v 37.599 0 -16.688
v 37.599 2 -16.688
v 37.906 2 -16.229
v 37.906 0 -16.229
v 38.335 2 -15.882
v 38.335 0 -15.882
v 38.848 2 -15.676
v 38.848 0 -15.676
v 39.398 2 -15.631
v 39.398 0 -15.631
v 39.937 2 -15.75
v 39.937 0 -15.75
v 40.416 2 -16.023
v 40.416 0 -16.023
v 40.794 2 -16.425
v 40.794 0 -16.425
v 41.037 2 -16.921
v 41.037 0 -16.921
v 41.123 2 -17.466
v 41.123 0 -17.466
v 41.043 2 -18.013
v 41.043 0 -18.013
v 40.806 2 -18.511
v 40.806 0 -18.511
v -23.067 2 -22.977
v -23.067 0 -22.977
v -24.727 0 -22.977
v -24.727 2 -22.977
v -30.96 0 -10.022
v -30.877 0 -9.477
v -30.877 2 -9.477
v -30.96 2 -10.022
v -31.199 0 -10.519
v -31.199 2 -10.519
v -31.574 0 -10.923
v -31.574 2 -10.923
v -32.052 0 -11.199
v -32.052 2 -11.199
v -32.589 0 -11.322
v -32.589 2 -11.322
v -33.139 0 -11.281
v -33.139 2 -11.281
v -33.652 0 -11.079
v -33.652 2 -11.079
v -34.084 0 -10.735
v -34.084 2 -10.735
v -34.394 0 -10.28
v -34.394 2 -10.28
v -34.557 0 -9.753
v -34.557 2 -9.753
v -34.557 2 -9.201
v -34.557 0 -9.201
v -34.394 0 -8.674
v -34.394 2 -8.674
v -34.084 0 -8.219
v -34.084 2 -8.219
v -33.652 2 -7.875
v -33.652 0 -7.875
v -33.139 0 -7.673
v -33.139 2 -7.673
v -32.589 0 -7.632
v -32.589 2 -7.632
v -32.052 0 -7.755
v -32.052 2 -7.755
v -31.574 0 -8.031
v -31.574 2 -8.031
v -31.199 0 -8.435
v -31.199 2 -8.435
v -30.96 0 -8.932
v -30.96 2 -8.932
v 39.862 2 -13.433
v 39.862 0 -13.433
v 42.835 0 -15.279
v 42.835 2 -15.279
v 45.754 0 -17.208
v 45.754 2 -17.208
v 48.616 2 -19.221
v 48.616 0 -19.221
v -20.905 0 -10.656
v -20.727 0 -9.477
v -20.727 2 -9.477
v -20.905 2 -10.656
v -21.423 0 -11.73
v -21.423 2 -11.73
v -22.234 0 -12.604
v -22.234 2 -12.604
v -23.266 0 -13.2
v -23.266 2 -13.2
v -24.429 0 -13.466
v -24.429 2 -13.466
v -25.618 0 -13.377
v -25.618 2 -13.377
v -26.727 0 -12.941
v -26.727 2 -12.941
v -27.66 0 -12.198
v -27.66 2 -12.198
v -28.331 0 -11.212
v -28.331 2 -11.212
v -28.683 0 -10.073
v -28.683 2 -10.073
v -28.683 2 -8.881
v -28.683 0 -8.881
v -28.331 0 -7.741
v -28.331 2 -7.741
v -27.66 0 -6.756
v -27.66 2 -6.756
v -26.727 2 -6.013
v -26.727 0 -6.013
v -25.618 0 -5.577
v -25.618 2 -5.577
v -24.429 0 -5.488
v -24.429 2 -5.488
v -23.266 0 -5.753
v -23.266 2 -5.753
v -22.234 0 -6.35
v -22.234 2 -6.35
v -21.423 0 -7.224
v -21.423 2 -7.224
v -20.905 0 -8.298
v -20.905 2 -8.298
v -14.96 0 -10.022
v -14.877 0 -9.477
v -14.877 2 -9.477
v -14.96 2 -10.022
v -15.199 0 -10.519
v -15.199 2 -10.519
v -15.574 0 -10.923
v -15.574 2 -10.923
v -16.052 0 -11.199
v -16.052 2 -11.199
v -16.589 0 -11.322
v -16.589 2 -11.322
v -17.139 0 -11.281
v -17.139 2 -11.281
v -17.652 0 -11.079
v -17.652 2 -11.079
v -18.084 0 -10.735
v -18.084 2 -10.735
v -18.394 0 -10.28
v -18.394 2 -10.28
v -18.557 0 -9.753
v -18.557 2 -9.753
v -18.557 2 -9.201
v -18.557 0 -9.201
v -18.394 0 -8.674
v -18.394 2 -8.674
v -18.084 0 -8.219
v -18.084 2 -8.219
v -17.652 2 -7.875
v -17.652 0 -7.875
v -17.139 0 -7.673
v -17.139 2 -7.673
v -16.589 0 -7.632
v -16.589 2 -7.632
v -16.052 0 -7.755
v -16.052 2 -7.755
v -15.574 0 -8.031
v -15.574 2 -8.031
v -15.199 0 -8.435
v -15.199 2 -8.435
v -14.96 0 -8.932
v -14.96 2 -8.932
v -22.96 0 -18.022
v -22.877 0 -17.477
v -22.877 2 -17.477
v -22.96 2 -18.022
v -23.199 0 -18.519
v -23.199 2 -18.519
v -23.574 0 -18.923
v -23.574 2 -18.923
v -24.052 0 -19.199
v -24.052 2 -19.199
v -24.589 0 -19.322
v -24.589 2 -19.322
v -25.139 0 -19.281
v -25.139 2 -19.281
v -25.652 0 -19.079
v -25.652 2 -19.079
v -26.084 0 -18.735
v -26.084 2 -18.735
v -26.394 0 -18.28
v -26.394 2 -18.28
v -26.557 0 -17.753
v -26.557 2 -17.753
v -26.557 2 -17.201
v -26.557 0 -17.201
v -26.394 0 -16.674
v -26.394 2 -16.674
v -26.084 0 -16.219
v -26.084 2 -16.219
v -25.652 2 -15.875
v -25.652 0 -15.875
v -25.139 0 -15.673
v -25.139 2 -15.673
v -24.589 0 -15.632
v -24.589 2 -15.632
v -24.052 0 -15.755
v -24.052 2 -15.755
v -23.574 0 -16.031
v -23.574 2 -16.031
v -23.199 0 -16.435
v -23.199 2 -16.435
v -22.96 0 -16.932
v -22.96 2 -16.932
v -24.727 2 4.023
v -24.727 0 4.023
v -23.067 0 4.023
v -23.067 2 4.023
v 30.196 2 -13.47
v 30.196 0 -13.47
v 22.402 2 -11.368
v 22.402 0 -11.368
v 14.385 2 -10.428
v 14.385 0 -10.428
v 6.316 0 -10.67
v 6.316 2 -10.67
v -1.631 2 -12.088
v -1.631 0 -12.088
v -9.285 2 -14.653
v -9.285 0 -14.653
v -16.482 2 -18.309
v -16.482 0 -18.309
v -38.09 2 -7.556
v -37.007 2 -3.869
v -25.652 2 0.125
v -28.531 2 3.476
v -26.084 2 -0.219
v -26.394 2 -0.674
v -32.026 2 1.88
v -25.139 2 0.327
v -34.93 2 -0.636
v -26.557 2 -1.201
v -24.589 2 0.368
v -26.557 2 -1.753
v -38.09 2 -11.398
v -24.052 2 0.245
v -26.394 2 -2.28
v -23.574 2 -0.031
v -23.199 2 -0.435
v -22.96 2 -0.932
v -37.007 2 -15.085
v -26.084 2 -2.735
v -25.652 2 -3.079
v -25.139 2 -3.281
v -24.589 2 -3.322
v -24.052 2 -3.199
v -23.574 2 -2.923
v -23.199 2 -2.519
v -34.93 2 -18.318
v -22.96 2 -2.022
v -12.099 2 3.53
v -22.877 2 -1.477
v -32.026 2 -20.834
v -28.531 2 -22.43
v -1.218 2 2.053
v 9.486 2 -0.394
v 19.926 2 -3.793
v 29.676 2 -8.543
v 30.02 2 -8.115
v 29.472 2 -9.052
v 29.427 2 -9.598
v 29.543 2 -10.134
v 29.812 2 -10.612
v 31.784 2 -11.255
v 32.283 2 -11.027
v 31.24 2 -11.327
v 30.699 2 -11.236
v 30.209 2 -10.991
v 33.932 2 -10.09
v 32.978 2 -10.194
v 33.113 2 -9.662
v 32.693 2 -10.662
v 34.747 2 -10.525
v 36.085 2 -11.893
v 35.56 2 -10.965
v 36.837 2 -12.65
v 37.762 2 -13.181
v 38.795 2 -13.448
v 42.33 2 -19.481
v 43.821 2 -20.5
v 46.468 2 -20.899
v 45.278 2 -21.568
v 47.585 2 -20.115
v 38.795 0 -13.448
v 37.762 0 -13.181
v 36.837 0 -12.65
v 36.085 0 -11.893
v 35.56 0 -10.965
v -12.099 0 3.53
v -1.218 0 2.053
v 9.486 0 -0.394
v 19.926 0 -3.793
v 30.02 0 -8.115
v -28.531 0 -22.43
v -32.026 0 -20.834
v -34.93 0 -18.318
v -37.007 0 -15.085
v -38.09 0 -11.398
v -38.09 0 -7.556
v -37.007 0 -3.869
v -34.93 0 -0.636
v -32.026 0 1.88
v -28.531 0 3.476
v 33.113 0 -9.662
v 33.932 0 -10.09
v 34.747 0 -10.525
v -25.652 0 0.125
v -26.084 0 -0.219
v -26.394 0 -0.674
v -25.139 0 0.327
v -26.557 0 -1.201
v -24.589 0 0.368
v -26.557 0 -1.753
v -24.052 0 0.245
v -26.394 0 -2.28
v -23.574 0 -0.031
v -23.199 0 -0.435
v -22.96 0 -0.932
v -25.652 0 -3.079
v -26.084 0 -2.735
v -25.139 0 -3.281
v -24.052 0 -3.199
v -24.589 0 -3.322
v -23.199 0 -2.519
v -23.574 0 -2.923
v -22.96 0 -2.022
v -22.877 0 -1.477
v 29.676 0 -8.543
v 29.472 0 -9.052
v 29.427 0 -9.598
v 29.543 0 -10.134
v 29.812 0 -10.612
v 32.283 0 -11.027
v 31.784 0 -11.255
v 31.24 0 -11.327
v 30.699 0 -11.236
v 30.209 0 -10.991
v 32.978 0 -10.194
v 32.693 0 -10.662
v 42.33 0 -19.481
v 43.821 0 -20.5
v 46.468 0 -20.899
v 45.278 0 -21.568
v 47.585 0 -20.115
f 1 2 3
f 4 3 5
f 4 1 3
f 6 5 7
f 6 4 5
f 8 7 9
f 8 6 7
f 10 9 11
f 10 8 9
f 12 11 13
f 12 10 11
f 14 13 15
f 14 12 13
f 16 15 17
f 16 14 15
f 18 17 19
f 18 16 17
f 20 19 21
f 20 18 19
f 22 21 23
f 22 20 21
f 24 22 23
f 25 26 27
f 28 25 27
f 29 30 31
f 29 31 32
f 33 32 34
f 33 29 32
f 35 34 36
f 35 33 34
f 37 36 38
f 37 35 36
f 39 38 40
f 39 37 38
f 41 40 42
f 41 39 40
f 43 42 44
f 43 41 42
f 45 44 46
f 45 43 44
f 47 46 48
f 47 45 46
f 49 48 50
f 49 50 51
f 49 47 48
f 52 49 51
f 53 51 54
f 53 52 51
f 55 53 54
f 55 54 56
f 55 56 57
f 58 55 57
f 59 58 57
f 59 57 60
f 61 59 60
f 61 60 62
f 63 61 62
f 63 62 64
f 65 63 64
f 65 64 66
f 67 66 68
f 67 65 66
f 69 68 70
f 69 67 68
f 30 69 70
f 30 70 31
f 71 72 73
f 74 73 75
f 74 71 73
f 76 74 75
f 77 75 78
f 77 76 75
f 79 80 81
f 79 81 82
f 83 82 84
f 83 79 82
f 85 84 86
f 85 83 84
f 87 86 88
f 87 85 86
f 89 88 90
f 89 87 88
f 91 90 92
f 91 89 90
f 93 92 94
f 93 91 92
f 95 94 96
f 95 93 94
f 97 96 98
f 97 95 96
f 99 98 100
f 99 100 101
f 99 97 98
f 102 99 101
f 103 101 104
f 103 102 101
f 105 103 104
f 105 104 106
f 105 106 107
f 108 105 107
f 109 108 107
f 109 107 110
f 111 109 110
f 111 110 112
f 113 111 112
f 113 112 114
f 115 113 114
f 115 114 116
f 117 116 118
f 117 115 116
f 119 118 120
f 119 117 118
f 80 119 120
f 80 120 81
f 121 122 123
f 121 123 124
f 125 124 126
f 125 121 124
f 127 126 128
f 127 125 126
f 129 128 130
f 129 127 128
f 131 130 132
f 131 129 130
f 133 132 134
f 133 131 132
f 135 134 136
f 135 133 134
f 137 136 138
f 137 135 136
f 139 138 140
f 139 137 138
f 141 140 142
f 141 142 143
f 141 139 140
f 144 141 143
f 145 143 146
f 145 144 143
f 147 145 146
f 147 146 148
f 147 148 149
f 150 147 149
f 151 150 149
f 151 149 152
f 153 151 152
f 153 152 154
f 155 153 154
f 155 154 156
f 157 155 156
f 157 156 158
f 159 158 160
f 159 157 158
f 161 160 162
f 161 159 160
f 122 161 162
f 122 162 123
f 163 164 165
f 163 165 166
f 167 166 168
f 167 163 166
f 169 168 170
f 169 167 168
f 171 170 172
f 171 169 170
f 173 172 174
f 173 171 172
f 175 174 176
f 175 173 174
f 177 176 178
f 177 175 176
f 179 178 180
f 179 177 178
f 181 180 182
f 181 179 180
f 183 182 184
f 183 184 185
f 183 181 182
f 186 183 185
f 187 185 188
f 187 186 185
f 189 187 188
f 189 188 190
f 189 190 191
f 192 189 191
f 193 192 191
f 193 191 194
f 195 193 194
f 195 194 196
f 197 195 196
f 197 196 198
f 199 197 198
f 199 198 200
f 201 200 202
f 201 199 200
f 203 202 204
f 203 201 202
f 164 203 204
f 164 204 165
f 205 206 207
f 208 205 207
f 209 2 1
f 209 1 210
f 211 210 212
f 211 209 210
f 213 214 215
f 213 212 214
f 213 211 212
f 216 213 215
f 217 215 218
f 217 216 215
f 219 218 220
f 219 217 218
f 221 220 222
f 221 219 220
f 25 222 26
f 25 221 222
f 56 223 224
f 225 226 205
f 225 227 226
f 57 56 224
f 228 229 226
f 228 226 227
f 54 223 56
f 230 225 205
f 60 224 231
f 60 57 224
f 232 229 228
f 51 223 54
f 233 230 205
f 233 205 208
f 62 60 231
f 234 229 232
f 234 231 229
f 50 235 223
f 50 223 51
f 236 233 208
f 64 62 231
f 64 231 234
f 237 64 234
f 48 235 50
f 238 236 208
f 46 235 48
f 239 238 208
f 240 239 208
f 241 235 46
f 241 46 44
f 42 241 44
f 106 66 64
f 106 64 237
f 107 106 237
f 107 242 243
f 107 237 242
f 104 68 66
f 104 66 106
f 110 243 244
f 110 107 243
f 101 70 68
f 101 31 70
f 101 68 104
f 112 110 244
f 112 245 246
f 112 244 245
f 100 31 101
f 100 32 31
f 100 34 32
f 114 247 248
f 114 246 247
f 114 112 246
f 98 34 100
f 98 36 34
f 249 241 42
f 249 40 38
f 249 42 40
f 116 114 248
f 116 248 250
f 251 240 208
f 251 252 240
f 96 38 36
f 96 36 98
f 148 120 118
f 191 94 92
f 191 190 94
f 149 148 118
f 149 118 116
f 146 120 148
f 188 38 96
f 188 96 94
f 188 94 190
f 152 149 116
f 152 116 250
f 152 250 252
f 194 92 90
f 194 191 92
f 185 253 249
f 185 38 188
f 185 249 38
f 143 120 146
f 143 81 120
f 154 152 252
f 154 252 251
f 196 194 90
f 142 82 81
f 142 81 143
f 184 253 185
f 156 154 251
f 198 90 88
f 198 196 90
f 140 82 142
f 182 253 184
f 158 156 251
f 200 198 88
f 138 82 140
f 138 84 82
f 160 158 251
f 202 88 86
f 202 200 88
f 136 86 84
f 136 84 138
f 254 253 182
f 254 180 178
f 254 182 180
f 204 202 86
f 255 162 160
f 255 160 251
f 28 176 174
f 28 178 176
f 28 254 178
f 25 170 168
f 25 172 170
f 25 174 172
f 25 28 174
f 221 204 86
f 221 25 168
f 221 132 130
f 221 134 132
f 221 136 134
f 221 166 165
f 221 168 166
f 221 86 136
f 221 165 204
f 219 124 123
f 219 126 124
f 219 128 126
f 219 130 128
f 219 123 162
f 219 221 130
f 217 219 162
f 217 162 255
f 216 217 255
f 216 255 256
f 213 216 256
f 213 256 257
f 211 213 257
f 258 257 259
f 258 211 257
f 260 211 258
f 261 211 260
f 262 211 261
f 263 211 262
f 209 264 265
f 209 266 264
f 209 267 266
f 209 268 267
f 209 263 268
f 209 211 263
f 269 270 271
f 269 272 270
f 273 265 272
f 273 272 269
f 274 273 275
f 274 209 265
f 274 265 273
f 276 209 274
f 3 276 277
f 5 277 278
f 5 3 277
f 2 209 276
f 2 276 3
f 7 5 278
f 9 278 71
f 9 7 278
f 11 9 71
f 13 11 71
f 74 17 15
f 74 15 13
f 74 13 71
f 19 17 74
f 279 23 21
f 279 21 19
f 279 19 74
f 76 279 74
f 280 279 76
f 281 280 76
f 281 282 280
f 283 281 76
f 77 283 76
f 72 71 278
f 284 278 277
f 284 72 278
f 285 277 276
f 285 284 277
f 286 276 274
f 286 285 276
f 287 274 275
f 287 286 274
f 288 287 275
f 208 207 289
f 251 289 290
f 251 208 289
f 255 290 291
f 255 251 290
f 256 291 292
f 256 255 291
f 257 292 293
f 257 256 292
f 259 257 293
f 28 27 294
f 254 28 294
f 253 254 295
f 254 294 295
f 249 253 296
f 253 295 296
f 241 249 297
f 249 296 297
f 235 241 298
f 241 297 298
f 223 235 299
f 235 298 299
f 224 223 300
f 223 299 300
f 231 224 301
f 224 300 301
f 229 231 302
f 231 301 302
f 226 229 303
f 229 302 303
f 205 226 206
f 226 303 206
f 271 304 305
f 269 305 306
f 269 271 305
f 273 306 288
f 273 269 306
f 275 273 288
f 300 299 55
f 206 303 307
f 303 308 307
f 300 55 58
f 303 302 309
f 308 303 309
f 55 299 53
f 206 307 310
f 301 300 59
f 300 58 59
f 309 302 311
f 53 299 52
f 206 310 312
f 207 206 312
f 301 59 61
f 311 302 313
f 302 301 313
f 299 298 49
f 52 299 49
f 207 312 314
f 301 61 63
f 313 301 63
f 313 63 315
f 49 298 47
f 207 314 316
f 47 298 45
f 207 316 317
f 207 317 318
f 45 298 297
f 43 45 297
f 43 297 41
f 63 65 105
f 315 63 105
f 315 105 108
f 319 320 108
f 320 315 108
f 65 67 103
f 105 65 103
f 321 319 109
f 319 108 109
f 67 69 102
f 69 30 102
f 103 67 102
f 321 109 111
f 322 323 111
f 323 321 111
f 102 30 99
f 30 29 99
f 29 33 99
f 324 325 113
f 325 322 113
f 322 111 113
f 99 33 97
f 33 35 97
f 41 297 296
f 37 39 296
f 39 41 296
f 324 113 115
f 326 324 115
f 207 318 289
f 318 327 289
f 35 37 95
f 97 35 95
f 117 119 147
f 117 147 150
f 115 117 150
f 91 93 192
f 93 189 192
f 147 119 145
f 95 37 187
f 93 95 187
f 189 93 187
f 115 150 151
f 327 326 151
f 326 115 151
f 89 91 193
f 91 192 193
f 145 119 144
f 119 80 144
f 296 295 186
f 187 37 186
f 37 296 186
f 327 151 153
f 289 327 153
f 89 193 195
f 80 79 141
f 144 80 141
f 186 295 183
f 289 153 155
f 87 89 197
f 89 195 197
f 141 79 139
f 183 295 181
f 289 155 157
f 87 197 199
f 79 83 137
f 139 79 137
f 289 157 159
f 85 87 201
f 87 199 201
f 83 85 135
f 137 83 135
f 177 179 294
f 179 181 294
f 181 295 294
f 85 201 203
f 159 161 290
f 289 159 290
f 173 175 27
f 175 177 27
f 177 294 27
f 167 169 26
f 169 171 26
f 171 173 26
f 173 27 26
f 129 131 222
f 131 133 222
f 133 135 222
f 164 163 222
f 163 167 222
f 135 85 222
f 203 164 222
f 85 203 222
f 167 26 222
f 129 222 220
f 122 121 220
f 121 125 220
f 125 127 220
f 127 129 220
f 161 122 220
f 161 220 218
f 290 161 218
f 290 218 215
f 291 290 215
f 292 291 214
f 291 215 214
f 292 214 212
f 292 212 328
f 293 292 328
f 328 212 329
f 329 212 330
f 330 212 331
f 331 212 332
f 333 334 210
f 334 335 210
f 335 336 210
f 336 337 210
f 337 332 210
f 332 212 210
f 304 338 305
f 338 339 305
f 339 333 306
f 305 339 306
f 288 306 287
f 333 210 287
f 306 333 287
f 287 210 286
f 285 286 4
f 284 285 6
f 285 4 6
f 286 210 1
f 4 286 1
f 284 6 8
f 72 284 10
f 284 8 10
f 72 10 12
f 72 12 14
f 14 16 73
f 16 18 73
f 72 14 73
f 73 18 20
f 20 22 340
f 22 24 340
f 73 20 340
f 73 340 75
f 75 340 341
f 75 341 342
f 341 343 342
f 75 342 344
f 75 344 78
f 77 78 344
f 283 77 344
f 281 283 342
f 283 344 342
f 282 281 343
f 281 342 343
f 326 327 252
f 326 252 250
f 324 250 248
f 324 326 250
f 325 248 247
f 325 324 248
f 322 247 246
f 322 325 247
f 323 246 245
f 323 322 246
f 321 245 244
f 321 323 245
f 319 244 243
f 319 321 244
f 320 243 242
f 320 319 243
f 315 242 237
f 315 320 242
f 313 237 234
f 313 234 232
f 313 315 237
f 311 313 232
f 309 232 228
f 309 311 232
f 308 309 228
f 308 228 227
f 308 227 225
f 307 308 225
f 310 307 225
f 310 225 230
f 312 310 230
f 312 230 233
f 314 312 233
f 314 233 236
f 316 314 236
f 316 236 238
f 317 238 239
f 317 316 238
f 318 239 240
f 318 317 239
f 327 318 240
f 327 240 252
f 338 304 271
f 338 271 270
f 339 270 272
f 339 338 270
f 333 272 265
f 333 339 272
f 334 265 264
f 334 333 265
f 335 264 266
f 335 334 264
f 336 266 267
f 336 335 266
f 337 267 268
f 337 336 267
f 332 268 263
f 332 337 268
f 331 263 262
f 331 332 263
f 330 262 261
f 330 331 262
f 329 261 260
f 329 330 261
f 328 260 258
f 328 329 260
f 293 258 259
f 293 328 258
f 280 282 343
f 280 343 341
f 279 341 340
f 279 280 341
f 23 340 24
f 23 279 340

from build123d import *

# Parameters (mm, degrees)
SKETCH1_R           = 1.85
SKETCH1_R_2         = 4
BOSS_EXTRUDE1_DEPTH = 2
CUT_EXTRUDE1_DEPTH  = 3


with BuildPart() as part:
    # Sketch1 → Boss-Extrude1 (new body)
    with BuildSketch(Plane(origin=(0, 0, 0), x_dir=(1, 0, 0), z_dir=(0, 1, 0))):
        with BuildLine():
            Line((39.272536472, 22.976935119), (-24.727463528, 22.976935119))
            ThreePointArc((-24.727463528, 22.976935119), (-38.227463528, 9.476935119), (-24.727463528, -4.023064881))
            Line((-24.727463528, -4.023064881), (39.272536472, -4.023064881))
            ThreePointArc((39.272536472, -4.023064881), (52.772536472, 9.476935119), (39.272536472, 22.976935119))
        make_face()
        with Locations((-24.727463528, 17.476935119)):
            Circle(SKETCH1_R, mode=Mode.SUBTRACT)
        with Locations((-24.727463528, 9.476935119)):
            Circle(SKETCH1_R_2, mode=Mode.SUBTRACT)
        with Locations((-32.727463528, 9.476935119)):
            Circle(SKETCH1_R, mode=Mode.SUBTRACT)
        with Locations((-24.727463528, 1.476935119)):
            Circle(SKETCH1_R, mode=Mode.SUBTRACT)
        with Locations((-16.727463528, 9.476935119)):
            Circle(SKETCH1_R, mode=Mode.SUBTRACT)
        with Locations((39.272536472, 17.476935119)):
            Circle(SKETCH1_R, mode=Mode.SUBTRACT)
        with Locations((39.272536472, 9.476935119)):
            Circle(SKETCH1_R_2, mode=Mode.SUBTRACT)
        with Locations((31.272536472, 9.476935119)):
            Circle(SKETCH1_R, mode=Mode.SUBTRACT)
        with Locations((47.272536472, 9.476935119)):
            Circle(SKETCH1_R, mode=Mode.SUBTRACT)
        with Locations((39.272536472, 1.476935119)):
            Circle(SKETCH1_R, mode=Mode.SUBTRACT)
    extrude(amount=BOSS_EXTRUDE1_DEPTH)

    # Sketch2 → Cut-Extrude1 (cut, through all)
    with BuildSketch(Plane(origin=(0, 2, 0), x_dir=(1, 0, 0), z_dir=(0, 1, 0))):
        with BuildLine():
            Line((-23.067485442, 22.976935119), (42.777422328, 34.888708749))
            Line((42.777422328, 34.888708749), (45.278061915, 21.567578781))
            ThreePointArc((45.278061915, 21.567578781), (10.860216356, 10.387702722), (-23.067485442, 22.976935119))
        make_face()
        with BuildLine():
            Line((48.61621824, 19.220938968), (77.215135597, 13.399575669))
            Line((77.215135597, 13.399575669), (46.358944508, -30.129693903))
            Line((46.358944508, -30.129693903), (-23.067485442, -4.023064881))
            ThreePointArc((-23.067485442, -4.023064881), (14.611544165, 1.933144375), (48.61621824, 19.220938968))
        make_face()
    extrude(amount=-CUT_EXTRUDE1_DEPTH, mode=Mode.SUBTRACT)


solid = part.part
